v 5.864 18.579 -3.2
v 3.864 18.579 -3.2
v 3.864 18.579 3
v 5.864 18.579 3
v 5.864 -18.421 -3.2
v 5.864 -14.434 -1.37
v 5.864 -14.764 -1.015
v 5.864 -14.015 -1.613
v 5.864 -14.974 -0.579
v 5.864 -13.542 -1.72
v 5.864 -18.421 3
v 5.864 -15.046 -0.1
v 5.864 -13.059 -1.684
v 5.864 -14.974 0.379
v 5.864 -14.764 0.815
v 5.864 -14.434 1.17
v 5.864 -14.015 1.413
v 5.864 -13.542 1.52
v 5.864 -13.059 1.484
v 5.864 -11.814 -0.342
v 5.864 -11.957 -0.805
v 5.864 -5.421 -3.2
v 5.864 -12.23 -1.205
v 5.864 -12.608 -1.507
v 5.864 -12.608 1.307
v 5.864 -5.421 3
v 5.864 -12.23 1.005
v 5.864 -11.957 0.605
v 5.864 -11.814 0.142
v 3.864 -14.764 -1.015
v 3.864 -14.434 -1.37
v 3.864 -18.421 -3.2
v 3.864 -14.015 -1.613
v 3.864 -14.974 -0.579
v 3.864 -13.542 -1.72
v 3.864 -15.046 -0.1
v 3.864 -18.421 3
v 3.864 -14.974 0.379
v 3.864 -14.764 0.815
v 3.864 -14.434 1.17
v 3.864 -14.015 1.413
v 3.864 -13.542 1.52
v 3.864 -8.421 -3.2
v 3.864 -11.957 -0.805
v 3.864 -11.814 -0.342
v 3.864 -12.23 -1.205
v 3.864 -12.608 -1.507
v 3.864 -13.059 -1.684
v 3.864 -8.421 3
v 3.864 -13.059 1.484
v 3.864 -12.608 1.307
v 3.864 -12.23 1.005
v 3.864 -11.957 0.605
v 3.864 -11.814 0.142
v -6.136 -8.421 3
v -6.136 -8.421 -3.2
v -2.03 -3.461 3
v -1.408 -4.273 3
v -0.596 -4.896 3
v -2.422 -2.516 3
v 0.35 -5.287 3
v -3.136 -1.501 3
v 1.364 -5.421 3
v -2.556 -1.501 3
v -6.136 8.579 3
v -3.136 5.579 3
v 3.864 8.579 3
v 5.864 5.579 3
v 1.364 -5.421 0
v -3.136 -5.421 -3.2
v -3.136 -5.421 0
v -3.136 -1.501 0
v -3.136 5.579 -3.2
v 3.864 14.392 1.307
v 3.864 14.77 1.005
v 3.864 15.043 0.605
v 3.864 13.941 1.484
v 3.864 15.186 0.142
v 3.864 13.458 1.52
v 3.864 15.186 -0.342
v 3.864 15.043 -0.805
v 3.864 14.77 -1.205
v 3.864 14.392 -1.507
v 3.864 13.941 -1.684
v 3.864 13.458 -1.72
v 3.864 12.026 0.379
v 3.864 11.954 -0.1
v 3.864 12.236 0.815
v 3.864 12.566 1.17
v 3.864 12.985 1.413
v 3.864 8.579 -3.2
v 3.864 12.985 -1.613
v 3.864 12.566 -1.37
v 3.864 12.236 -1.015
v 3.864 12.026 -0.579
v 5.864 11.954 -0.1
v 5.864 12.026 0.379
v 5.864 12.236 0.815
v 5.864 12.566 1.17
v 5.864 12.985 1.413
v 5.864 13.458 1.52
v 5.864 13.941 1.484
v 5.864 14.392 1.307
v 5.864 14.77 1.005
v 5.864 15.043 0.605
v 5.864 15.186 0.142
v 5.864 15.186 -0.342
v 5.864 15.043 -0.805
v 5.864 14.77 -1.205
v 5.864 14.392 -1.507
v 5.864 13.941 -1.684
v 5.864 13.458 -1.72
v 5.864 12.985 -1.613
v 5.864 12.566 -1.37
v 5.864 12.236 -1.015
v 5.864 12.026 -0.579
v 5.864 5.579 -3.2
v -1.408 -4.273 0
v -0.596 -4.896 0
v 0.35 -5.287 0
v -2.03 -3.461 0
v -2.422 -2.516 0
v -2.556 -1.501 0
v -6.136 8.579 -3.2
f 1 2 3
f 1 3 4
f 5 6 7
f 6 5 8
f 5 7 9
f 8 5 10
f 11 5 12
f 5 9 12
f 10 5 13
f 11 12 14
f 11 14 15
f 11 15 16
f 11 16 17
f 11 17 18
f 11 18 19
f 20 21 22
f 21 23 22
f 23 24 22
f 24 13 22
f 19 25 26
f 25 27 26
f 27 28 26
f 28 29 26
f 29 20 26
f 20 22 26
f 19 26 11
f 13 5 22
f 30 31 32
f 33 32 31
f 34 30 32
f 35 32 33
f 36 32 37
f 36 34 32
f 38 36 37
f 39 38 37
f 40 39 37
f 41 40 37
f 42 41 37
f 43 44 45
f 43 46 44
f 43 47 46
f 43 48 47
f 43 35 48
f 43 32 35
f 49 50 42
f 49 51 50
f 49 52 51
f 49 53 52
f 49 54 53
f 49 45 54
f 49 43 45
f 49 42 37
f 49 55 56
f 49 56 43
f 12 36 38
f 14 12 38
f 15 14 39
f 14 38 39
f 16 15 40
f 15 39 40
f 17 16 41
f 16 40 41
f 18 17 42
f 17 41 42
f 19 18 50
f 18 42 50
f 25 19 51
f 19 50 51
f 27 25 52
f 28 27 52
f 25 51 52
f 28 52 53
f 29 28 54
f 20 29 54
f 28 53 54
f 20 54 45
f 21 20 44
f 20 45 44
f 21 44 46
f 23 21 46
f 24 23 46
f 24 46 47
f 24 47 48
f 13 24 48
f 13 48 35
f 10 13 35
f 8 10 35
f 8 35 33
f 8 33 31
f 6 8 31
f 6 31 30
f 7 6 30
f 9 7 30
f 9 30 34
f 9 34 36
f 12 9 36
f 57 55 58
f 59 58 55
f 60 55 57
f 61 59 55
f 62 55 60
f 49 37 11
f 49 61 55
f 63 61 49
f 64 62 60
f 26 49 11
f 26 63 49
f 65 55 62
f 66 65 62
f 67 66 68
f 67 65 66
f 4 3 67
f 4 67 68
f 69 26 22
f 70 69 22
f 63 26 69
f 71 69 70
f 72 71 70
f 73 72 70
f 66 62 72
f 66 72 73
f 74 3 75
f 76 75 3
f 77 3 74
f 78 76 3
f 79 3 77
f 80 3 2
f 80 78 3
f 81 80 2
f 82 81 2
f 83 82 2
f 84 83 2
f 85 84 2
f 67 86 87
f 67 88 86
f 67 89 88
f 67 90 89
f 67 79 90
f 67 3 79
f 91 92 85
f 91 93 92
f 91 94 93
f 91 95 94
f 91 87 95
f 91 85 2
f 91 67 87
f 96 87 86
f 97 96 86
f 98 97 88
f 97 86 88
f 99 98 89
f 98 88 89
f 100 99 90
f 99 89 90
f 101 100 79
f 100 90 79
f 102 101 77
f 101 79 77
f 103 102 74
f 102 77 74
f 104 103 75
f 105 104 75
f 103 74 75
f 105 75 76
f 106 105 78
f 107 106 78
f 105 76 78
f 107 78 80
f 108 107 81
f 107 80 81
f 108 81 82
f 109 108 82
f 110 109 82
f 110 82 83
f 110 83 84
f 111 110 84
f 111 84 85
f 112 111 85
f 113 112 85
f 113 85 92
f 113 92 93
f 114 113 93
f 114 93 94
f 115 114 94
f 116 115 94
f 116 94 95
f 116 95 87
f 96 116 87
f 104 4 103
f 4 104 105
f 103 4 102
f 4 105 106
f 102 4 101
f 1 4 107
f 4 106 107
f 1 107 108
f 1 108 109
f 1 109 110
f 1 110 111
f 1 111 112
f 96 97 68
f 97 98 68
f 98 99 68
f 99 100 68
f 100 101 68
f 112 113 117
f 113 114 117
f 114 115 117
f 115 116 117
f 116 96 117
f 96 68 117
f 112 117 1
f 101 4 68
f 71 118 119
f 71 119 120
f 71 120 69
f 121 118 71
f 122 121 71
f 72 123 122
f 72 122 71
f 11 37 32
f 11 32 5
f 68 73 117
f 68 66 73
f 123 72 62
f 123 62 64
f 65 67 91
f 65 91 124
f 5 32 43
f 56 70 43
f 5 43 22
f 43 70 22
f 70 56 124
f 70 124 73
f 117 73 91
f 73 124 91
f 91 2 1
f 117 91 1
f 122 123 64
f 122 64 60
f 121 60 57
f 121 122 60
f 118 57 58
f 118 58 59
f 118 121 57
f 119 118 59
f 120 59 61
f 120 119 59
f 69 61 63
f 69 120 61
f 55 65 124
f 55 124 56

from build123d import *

# Parameters (mm, degrees)
EXTRUDE_1_DEPTH     = 3
EXTRUDE_5_DEPTH     = 3.2
SKETCH_6_W          = 2
SKETCH_6_H          = 6.2
EXTRUDE_6_DEPTH     = 10
SKETCH_7_W          = 2
SKETCH_7_H          = 6.2
EXTRUDE_7_DEPTH     = 10
CUT_EXTRUDE_1_REACH = 23.341
SKETCH_8_R          = 1.625


with BuildPart() as part:
    # 草圖1 → 填料-伸長1 (new body)
    with BuildSketch(Plane.XY):
        with BuildLine():
            Line((5.864342343, -5.42098501), (5.864342343, -8.42098501))
            Line((5.864342343, -8.42098501), (-6.135657657, -8.42098501))
            Line((-6.135657657, -8.42098501), (-6.135657657, 8.57901499))
            Line((-6.135657657, 8.57901499), (5.864342343, 8.57901499))
            Line((5.864342343, 8.57901499), (5.864342343, 5.57901499))
            Line((5.864342343, 5.57901499), (-3.135657657, 5.57901499))
            Line((-3.135657657, 5.57901499), (-3.135657657, -1.50098501))
            Line((-3.135657657, -1.50098501), (-2.555657657, -1.50098501))
            ThreePointArc((-2.555657657, -1.50098501), (-1.407516239, -4.272843593), (1.364342343, -5.42098501))
            Line((1.364342343, -5.42098501), (5.864342343, -5.42098501))
        make_face()
    extrude(amount=EXTRUDE_1_DEPTH)

    # 草圖5 → 填料-伸長5 (add)
    with BuildSketch(Plane(origin=(0, 0, 0), x_dir=(-1, 0, 0), z_dir=(0, 0, -1))):
        Polygon((3.135657657, 5.57901499), (-5.864342343, 5.57901499), (-5.864342343, 8.57901499), (6.135657657, 8.57901499), (6.135657657, -8.42098501), (-5.864342343, -8.42098501), (-5.864342343, -5.42098501), (3.135657657, -5.42098501), align=None)
    extrude(amount=EXTRUDE_5_DEPTH)

    # 草圖6 → 填料-伸長6 (add)
    with BuildSketch(Plane(origin=(0, 8.57901499, 0), x_dir=(1, 0, 0), z_dir=(0, 1, 0))):
        with Locations((4.864342343, 0.1)):
            Rectangle(SKETCH_6_W, SKETCH_6_H)
    extrude(amount=EXTRUDE_6_DEPTH)

    # 草圖7 → 填料-伸長7 (add)
    with BuildSketch(Plane.XZ.offset(8.42098501)):
        with Locations((4.864342343, -0.1)):
            Rectangle(SKETCH_7_W, SKETCH_7_H)
    extrude(amount=EXTRUDE_7_DEPTH)

    # 草圖8 → 除料-伸長1 (cut, up to next)
    with BuildSketch(Plane.ZY.offset(-3.864342343), mode=Mode.PRIVATE) as cut_extrude_1_sk1:
        with Locations(Location((-0.1, -13.42098501, 0), (0, 0, 270))):
            Circle(SKETCH_8_R)
    cut_extrude_1_tool1 = extrude(cut_extrude_1_sk1.sketch, amount=-CUT_EXTRUDE_1_REACH, mode=Mode.PRIVATE) & part.part
    # 草圖8 → 除料-伸長1 (cut, up to next)
    with BuildSketch(Plane.ZY.offset(-3.864342343), mode=Mode.PRIVATE) as cut_extrude_1_sk2:
        with Locations(Location((-0.1, 13.57901499, 0), (0, 0, 270))):
            Circle(SKETCH_8_R)
    cut_extrude_1_tool2 = extrude(cut_extrude_1_sk2.sketch, amount=-CUT_EXTRUDE_1_REACH, mode=Mode.PRIVATE) & part.part
    add(cut_extrude_1_tool1.solids().sort_by_distance((3.864342, -13.420985, -0.1))[0], mode=Mode.SUBTRACT)
    add(cut_extrude_1_tool2.solids().sort_by_distance((3.864342, 13.579015, -0.1))[0], mode=Mode.SUBTRACT)


solid = part.part
